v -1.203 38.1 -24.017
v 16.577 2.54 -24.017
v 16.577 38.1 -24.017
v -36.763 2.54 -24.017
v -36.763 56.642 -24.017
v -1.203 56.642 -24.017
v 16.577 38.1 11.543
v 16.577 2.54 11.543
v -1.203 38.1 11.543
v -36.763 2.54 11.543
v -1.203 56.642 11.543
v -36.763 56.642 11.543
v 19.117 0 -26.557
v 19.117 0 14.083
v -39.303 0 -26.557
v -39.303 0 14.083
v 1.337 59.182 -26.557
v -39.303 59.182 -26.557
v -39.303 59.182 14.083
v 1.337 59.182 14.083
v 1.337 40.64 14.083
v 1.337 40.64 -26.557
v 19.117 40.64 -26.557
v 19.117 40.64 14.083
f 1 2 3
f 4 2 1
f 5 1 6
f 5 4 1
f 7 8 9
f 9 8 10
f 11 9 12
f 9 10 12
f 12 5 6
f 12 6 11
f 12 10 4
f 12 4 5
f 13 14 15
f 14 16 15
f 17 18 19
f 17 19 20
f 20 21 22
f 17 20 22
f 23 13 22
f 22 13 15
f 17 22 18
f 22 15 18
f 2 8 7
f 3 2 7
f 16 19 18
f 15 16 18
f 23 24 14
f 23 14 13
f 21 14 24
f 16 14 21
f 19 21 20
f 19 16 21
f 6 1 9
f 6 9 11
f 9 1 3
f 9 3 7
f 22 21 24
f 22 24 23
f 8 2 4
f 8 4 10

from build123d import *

# Parameters (mm, degrees)
SKETCH1_W           = 40.64
SKETCH1_H           = 40.64
BOSS_EXTRUDE1_DEPTH = 59.182
SKETCH2_W           = 40.64
SKETCH2_H           = 40.64
BOSS_EXTRUDE2_DEPTH = 17.78
SHELL1_START        = -36.762774376
SHELL1_OUTLINE_W    = 54.102
SHELL1_OUTLINE_H    = 35.56
SHELL1_DEPTH        = 35.56
SHELL1_START_2      = -1.202774376
SHELL1_2_OUTLINE_W  = 35.56
SHELL1_2_OUTLINE_H  = 35.56
SHELL1_2_DEPTH      = 17.78


# Read off the part's stored shape, not the designer's step: Shell1
with BuildPart() as part:
    # Sketch1 → Boss-Extrude1 (new body)
    with BuildSketch(Plane(origin=(0, 0, 0), x_dir=(1, 0, 0), z_dir=(0, 1, 0))):
        with Locations((-18.982774376, 6.236831683)):
            Rectangle(SKETCH1_W, SKETCH1_H)
    extrude(amount=BOSS_EXTRUDE1_DEPTH)

    # Sketch2 → Boss-Extrude2 (add)
    with BuildSketch(Plane(origin=(1.337225624, 0, 0), x_dir=(0, 0, -1), z_dir=(1, 0, 0))):
        with Locations((6.236831683, 20.32)):
            Rectangle(SKETCH2_W, SKETCH2_H)
    extrude(amount=BOSS_EXTRUDE2_DEPTH)

    # Shell1 outline → Shell1 (cut)
    with BuildSketch(Plane.YZ.offset(SHELL1_START)):
        with Locations((29.591, -6.236831683)):
            Rectangle(SHELL1_OUTLINE_W, SHELL1_OUTLINE_H)
    extrude(amount=SHELL1_DEPTH, mode=Mode.SUBTRACT)

    # Shell1 2 outline → Shell1 2 (cut)
    with BuildSketch(Plane.YZ.offset(SHELL1_START_2)):
        with Locations((20.32, -6.236831683)):
            Rectangle(SHELL1_2_OUTLINE_W, SHELL1_2_OUTLINE_H)
    extrude(amount=SHELL1_2_DEPTH, mode=Mode.SUBTRACT)


solid = part.part
